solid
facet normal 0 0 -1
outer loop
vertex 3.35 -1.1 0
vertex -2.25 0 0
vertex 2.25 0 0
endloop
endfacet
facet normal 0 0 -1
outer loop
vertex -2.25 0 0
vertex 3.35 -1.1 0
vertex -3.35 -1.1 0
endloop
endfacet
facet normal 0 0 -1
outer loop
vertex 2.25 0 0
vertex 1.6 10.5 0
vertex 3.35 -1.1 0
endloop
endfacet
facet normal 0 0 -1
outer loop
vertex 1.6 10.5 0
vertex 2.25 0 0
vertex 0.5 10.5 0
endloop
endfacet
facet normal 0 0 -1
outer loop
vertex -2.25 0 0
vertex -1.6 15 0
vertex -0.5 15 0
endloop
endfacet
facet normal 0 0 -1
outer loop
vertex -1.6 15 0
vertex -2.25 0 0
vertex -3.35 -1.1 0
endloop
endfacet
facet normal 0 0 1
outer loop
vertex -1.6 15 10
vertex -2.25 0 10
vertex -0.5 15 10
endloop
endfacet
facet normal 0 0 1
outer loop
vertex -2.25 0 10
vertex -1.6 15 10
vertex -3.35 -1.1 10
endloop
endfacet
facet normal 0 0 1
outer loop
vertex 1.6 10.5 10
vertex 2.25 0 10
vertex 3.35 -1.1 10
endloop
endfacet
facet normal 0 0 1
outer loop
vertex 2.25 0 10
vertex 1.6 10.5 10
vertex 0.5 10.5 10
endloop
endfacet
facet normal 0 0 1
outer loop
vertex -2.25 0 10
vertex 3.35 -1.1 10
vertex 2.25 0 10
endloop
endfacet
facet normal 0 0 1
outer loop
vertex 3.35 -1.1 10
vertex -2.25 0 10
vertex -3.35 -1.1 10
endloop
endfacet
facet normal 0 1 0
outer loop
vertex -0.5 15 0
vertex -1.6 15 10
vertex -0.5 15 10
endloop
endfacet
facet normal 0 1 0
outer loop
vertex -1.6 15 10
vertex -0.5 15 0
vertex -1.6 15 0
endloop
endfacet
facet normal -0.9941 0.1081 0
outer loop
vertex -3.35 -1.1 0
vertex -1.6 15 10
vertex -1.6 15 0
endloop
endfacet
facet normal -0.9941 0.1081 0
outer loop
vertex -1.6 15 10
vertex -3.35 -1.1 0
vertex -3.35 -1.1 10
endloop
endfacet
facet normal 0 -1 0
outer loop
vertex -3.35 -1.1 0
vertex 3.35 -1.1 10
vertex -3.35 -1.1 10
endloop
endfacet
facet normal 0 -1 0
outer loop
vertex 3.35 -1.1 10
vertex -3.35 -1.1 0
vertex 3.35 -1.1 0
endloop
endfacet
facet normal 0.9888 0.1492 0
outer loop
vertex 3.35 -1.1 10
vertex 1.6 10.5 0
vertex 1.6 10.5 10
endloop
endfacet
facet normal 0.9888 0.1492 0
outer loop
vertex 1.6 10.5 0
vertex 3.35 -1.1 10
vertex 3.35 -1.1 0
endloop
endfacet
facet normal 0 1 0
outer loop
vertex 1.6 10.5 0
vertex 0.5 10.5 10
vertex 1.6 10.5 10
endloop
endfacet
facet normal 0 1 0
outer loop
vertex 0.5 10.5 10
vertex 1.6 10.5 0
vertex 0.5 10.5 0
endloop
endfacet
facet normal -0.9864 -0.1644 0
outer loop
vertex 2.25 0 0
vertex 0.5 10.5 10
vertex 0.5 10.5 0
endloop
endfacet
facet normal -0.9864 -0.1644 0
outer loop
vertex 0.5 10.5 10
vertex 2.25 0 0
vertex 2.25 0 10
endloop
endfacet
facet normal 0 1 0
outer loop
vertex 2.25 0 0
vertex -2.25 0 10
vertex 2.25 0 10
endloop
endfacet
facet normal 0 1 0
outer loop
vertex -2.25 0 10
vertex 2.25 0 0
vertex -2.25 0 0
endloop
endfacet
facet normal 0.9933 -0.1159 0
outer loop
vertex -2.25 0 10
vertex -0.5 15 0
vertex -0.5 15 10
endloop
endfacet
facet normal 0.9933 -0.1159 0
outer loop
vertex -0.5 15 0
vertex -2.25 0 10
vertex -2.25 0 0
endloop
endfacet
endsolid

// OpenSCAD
// Tumbler Tag by xifle
// Modified by teejaydub to add an embossed image.

// preview[view:west, tilt:top diagonal]
/* [Global] */

// The maximum glass thickness this tag will work with [mm]
GLASS_MAX = 3.5;

// The minimum glass thickness this tag will work with [mm]
GLASS_MIN = 1;

// The height of the tag [mm]
HEIGHT = 15; //[5:30]

// The width of the tag [mm]
WIDTH = 10; //[5:30]

// Wall thickness [mm]
WALL = 1.1;

// Load a 30x30 pixel image to be embossed onto your tag.  
// Simple shapes with blurry edges work best. 
// Try the Invert Colors checkbox!
image_file = "symbol.dat"; // [image_surface:30x30]

/* [Hidden] */

RADIUS = (WALL-0.1)/2;

ANGLE = atan2(GLASS_MAX/2, HEIGHT);

SYMBOL_WIDTH = WIDTH * 0.8;

difference() {
	linear_extrude(height=WIDTH) {
		union() {
			halfed_outline(GLASS_MAX, GLASS_MIN, HEIGHT*0.7, RADIUS, WALL);
			mirror([1,0,0]) {
				halfed_outline(GLASS_MAX, GLASS_MIN, HEIGHT, RADIUS, WALL);
			}
		}
	}
	translate([-GLASS_MAX/2-WALL, HEIGHT/2, WIDTH/2])
		rotate([90-ANGLE, -90, 90])
//			resize([SYMBOL_WIDTH, SYMBOL_WIDTH, 0])  // not supported by Customizer
//				scale([1, 1, WALL]) 
			scale([SYMBOL_WIDTH/30, SYMBOL_WIDTH/30, WALL]) 
				surface(file=image_file, center=true, convexity=5); 
}

module halfed_outline(max, min, height, radius, wall) {
	polygon(points=[[0,0],[max/2+radius,0],[min/2,height],[min/2+wall,height], 
		[max/2+radius+wall,-wall], [0,-wall]], paths=[[0,1,2,3,4,5]]);
}
